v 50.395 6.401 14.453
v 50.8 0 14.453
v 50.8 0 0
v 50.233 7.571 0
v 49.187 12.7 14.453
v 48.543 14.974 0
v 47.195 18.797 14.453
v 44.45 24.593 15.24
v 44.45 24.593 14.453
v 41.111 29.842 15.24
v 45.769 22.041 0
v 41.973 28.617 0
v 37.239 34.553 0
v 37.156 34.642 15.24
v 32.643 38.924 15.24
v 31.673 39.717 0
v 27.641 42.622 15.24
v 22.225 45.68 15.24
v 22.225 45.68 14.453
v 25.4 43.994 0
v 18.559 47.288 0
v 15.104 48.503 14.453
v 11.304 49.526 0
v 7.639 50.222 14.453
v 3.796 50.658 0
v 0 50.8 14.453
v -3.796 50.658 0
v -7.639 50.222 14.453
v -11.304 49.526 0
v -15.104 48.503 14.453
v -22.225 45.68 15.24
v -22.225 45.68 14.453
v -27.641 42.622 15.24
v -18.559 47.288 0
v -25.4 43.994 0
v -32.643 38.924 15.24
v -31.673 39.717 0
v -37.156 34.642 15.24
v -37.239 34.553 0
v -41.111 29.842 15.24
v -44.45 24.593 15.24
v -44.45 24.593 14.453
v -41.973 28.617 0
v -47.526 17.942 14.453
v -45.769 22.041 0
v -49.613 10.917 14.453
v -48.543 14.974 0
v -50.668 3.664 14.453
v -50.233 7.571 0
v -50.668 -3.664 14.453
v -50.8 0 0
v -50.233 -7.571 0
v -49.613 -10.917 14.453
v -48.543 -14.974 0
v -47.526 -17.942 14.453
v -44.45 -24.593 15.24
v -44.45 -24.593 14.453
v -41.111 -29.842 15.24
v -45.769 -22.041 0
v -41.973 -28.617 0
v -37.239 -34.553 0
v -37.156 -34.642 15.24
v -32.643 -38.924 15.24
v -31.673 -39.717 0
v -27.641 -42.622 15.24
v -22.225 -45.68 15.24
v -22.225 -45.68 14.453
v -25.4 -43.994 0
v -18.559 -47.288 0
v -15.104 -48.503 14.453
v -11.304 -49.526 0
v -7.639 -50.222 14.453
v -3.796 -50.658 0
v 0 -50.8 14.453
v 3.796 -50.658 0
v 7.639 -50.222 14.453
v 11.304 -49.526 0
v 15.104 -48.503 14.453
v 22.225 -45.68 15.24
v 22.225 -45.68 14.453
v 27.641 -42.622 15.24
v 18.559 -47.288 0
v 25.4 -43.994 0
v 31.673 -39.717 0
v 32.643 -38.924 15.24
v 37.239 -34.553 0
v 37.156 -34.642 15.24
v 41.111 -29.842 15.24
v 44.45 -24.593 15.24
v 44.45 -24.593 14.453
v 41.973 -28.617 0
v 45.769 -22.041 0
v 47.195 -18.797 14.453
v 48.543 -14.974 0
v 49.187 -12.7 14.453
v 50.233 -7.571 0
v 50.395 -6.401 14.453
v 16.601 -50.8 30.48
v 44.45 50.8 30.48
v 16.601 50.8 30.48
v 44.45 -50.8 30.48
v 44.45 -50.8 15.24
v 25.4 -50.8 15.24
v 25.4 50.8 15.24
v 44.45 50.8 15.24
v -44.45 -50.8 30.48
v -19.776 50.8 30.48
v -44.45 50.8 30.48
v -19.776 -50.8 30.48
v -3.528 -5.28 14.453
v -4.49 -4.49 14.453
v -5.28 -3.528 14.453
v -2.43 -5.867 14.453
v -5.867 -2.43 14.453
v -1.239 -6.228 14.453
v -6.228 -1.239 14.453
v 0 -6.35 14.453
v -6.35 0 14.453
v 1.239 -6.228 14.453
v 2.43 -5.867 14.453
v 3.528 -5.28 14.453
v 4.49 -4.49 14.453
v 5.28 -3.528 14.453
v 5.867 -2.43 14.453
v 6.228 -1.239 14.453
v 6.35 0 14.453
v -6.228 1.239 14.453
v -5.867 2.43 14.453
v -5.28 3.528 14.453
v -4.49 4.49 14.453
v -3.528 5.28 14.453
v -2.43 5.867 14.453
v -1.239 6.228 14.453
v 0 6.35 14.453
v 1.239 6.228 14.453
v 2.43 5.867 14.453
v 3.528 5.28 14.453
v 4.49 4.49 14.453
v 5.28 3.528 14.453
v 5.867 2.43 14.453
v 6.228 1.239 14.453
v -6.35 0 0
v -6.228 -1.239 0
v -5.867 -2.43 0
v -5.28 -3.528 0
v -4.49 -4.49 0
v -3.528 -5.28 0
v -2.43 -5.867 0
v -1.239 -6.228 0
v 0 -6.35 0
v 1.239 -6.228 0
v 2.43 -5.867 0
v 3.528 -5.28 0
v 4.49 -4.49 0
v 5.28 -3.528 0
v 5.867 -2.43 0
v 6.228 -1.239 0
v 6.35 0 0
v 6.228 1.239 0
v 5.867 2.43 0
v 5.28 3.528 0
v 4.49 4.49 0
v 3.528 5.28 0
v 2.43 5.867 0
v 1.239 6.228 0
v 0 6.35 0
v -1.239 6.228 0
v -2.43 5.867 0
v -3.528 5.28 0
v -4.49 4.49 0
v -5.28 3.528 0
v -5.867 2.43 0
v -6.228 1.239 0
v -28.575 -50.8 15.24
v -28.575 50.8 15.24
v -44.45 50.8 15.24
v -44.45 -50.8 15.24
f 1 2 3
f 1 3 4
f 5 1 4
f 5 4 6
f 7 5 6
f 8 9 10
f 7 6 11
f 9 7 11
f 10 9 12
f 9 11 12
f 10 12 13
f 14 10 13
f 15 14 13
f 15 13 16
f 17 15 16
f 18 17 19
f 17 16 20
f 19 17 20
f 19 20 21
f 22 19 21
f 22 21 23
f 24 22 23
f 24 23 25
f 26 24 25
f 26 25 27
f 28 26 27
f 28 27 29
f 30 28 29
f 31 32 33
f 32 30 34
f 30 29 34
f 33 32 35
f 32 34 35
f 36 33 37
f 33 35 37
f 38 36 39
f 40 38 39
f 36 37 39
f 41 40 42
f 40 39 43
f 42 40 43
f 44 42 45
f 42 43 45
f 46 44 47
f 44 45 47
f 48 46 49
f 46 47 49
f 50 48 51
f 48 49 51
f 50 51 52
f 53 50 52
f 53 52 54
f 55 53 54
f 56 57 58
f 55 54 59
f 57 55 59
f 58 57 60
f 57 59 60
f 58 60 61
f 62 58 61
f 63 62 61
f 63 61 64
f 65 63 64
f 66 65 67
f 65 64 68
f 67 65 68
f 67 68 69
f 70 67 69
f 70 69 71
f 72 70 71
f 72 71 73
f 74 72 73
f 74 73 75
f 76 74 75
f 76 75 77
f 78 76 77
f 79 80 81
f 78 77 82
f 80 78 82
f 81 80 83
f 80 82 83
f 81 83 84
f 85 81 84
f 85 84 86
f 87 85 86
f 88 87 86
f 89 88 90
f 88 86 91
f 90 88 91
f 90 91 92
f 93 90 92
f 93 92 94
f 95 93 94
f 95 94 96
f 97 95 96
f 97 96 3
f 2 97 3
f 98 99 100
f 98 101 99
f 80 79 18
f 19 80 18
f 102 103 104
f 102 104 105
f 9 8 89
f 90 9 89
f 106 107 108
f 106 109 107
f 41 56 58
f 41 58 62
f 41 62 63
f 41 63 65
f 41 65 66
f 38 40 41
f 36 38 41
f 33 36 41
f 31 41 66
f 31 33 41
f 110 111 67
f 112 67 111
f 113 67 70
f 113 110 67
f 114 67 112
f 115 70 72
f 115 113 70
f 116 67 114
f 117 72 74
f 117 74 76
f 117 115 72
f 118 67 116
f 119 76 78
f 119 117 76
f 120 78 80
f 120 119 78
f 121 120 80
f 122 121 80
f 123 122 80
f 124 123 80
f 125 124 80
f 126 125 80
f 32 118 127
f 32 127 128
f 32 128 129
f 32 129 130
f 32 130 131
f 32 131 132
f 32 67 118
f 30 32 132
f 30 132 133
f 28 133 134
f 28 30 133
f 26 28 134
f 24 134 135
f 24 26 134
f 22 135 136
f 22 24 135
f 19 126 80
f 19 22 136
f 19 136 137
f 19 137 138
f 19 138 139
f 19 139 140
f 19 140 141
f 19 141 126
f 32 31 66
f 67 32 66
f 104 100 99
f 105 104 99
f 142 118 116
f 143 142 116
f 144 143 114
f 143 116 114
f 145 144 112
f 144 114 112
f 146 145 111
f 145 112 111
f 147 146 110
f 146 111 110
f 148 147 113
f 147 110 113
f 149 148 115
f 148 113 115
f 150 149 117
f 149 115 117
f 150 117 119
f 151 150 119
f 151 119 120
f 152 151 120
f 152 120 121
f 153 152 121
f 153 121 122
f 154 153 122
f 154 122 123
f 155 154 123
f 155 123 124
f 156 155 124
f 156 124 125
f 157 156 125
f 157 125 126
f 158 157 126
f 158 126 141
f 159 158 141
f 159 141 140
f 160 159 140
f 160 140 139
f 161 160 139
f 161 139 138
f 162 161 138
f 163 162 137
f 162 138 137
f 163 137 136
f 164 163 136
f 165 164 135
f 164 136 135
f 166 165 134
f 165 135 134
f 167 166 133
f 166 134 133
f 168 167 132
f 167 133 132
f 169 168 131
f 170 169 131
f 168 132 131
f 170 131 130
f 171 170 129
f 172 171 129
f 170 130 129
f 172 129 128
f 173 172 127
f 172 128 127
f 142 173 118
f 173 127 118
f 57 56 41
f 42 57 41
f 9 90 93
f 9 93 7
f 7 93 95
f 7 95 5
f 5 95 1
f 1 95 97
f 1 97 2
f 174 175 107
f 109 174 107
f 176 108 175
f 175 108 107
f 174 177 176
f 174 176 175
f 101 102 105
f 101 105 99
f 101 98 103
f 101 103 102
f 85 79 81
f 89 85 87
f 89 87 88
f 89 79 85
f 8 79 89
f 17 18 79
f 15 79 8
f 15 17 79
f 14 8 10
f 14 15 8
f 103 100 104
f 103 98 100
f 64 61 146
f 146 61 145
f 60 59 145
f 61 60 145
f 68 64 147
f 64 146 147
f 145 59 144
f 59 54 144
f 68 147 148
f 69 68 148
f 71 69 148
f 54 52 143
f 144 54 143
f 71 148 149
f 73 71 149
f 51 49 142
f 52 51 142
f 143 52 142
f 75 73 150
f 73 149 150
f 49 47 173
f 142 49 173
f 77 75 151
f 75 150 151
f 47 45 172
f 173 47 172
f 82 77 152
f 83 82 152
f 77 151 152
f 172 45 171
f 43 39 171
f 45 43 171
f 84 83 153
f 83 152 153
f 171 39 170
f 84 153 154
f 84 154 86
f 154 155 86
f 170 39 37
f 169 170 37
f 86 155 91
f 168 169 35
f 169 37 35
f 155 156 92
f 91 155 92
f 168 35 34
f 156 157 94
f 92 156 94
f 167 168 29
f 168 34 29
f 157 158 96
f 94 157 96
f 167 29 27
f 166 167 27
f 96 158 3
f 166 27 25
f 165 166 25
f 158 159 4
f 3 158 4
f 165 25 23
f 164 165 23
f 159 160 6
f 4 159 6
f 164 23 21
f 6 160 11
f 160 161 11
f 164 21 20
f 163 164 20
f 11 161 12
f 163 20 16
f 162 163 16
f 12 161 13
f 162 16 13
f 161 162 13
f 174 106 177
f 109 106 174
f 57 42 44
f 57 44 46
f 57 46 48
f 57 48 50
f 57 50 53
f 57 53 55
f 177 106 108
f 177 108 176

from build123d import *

# Parameters (mm, degrees)
F0_R          = 50.8
F1_DEPTH      = 15.24
F2_D          = 12.7
F3_R          = 6.35
F4_DEPTH      = 0.7874
F6_DEPTH      = 50.8
F6_DEPTH_BACK = 50.8


with BuildPart() as f1:
    # F0 (on Top) → F1 (new body)
    with BuildSketch(Plane.XY):
        Circle(F0_R)
    extrude(amount=F1_DEPTH)

    # F2 (through all)
    with Locations(Plane(origin=(0, 0, 0), x_dir=(1, 0, 0), z_dir=(0, 0, -1))):
        with Locations((0, 0)):
            Hole(F2_D / 2)

    # F3 (on face) → F4 (cut)
    with BuildSketch(Plane.XY.offset(15.24)):
        with BuildLine():
            Line((-44.45, -24.5934442484), (-44.45, 24.5934442484))
            ThreePointArc((-44.45, 24.5934442484), (-50.8, 0), (-44.45, -24.5934442484))
        make_face()
        with BuildLine():
            ThreePointArc((50.8, 0), (49.1868884968, 12.7), (44.45, 24.5934442484))
            Line((44.45, 24.5934442484), (44.45, -24.5934442484))
            ThreePointArc((44.45, -24.5934442484), (49.1868884968, -12.7), (50.8, 0))
        make_face()
        with BuildLine():
            ThreePointArc((22.225, 45.6802952596), (0, 50.8), (-22.225, 45.6802952596))
            Line((-22.225, 45.6802952596), (-22.225, -45.6802952596))
            ThreePointArc((-22.225, -45.6802952596), (0, -50.8), (22.225, -45.6802952596))
            Line((22.225, -45.6802952596), (22.225, 45.6802952596))
        make_face()
        Circle(F3_R, mode=Mode.SUBTRACT)
    extrude(amount=-F4_DEPTH, mode=Mode.SUBTRACT)


with BuildPart() as f6:
    # F5 (on Front) → F6 (new body, two sides)
    with BuildSketch(Plane.XZ) as f6_sk:
        Polygon((16.6011818976, 30.48), (25.4, 15.24), (44.45, 15.24), (44.45, 30.48), align=None)
    extrude(amount=F6_DEPTH)
    extrude(f6_sk.sketch, amount=-F6_DEPTH_BACK)


with BuildPart() as f6b:
    # F5 (on Front) → F6, piece 2 (new body, two sides)
    with BuildSketch(Plane.XZ) as f6_2_sk:
        Polygon((-19.7761818976, 30.48), (-44.45, 30.48), (-44.45, 15.24), (-28.575, 15.24), align=None)
    extrude(amount=F6_DEPTH)
    extrude(f6_2_sk.sketch, amount=-F6_DEPTH_BACK)


solid = Compound([f1.part, f6.part, f6b.part])
